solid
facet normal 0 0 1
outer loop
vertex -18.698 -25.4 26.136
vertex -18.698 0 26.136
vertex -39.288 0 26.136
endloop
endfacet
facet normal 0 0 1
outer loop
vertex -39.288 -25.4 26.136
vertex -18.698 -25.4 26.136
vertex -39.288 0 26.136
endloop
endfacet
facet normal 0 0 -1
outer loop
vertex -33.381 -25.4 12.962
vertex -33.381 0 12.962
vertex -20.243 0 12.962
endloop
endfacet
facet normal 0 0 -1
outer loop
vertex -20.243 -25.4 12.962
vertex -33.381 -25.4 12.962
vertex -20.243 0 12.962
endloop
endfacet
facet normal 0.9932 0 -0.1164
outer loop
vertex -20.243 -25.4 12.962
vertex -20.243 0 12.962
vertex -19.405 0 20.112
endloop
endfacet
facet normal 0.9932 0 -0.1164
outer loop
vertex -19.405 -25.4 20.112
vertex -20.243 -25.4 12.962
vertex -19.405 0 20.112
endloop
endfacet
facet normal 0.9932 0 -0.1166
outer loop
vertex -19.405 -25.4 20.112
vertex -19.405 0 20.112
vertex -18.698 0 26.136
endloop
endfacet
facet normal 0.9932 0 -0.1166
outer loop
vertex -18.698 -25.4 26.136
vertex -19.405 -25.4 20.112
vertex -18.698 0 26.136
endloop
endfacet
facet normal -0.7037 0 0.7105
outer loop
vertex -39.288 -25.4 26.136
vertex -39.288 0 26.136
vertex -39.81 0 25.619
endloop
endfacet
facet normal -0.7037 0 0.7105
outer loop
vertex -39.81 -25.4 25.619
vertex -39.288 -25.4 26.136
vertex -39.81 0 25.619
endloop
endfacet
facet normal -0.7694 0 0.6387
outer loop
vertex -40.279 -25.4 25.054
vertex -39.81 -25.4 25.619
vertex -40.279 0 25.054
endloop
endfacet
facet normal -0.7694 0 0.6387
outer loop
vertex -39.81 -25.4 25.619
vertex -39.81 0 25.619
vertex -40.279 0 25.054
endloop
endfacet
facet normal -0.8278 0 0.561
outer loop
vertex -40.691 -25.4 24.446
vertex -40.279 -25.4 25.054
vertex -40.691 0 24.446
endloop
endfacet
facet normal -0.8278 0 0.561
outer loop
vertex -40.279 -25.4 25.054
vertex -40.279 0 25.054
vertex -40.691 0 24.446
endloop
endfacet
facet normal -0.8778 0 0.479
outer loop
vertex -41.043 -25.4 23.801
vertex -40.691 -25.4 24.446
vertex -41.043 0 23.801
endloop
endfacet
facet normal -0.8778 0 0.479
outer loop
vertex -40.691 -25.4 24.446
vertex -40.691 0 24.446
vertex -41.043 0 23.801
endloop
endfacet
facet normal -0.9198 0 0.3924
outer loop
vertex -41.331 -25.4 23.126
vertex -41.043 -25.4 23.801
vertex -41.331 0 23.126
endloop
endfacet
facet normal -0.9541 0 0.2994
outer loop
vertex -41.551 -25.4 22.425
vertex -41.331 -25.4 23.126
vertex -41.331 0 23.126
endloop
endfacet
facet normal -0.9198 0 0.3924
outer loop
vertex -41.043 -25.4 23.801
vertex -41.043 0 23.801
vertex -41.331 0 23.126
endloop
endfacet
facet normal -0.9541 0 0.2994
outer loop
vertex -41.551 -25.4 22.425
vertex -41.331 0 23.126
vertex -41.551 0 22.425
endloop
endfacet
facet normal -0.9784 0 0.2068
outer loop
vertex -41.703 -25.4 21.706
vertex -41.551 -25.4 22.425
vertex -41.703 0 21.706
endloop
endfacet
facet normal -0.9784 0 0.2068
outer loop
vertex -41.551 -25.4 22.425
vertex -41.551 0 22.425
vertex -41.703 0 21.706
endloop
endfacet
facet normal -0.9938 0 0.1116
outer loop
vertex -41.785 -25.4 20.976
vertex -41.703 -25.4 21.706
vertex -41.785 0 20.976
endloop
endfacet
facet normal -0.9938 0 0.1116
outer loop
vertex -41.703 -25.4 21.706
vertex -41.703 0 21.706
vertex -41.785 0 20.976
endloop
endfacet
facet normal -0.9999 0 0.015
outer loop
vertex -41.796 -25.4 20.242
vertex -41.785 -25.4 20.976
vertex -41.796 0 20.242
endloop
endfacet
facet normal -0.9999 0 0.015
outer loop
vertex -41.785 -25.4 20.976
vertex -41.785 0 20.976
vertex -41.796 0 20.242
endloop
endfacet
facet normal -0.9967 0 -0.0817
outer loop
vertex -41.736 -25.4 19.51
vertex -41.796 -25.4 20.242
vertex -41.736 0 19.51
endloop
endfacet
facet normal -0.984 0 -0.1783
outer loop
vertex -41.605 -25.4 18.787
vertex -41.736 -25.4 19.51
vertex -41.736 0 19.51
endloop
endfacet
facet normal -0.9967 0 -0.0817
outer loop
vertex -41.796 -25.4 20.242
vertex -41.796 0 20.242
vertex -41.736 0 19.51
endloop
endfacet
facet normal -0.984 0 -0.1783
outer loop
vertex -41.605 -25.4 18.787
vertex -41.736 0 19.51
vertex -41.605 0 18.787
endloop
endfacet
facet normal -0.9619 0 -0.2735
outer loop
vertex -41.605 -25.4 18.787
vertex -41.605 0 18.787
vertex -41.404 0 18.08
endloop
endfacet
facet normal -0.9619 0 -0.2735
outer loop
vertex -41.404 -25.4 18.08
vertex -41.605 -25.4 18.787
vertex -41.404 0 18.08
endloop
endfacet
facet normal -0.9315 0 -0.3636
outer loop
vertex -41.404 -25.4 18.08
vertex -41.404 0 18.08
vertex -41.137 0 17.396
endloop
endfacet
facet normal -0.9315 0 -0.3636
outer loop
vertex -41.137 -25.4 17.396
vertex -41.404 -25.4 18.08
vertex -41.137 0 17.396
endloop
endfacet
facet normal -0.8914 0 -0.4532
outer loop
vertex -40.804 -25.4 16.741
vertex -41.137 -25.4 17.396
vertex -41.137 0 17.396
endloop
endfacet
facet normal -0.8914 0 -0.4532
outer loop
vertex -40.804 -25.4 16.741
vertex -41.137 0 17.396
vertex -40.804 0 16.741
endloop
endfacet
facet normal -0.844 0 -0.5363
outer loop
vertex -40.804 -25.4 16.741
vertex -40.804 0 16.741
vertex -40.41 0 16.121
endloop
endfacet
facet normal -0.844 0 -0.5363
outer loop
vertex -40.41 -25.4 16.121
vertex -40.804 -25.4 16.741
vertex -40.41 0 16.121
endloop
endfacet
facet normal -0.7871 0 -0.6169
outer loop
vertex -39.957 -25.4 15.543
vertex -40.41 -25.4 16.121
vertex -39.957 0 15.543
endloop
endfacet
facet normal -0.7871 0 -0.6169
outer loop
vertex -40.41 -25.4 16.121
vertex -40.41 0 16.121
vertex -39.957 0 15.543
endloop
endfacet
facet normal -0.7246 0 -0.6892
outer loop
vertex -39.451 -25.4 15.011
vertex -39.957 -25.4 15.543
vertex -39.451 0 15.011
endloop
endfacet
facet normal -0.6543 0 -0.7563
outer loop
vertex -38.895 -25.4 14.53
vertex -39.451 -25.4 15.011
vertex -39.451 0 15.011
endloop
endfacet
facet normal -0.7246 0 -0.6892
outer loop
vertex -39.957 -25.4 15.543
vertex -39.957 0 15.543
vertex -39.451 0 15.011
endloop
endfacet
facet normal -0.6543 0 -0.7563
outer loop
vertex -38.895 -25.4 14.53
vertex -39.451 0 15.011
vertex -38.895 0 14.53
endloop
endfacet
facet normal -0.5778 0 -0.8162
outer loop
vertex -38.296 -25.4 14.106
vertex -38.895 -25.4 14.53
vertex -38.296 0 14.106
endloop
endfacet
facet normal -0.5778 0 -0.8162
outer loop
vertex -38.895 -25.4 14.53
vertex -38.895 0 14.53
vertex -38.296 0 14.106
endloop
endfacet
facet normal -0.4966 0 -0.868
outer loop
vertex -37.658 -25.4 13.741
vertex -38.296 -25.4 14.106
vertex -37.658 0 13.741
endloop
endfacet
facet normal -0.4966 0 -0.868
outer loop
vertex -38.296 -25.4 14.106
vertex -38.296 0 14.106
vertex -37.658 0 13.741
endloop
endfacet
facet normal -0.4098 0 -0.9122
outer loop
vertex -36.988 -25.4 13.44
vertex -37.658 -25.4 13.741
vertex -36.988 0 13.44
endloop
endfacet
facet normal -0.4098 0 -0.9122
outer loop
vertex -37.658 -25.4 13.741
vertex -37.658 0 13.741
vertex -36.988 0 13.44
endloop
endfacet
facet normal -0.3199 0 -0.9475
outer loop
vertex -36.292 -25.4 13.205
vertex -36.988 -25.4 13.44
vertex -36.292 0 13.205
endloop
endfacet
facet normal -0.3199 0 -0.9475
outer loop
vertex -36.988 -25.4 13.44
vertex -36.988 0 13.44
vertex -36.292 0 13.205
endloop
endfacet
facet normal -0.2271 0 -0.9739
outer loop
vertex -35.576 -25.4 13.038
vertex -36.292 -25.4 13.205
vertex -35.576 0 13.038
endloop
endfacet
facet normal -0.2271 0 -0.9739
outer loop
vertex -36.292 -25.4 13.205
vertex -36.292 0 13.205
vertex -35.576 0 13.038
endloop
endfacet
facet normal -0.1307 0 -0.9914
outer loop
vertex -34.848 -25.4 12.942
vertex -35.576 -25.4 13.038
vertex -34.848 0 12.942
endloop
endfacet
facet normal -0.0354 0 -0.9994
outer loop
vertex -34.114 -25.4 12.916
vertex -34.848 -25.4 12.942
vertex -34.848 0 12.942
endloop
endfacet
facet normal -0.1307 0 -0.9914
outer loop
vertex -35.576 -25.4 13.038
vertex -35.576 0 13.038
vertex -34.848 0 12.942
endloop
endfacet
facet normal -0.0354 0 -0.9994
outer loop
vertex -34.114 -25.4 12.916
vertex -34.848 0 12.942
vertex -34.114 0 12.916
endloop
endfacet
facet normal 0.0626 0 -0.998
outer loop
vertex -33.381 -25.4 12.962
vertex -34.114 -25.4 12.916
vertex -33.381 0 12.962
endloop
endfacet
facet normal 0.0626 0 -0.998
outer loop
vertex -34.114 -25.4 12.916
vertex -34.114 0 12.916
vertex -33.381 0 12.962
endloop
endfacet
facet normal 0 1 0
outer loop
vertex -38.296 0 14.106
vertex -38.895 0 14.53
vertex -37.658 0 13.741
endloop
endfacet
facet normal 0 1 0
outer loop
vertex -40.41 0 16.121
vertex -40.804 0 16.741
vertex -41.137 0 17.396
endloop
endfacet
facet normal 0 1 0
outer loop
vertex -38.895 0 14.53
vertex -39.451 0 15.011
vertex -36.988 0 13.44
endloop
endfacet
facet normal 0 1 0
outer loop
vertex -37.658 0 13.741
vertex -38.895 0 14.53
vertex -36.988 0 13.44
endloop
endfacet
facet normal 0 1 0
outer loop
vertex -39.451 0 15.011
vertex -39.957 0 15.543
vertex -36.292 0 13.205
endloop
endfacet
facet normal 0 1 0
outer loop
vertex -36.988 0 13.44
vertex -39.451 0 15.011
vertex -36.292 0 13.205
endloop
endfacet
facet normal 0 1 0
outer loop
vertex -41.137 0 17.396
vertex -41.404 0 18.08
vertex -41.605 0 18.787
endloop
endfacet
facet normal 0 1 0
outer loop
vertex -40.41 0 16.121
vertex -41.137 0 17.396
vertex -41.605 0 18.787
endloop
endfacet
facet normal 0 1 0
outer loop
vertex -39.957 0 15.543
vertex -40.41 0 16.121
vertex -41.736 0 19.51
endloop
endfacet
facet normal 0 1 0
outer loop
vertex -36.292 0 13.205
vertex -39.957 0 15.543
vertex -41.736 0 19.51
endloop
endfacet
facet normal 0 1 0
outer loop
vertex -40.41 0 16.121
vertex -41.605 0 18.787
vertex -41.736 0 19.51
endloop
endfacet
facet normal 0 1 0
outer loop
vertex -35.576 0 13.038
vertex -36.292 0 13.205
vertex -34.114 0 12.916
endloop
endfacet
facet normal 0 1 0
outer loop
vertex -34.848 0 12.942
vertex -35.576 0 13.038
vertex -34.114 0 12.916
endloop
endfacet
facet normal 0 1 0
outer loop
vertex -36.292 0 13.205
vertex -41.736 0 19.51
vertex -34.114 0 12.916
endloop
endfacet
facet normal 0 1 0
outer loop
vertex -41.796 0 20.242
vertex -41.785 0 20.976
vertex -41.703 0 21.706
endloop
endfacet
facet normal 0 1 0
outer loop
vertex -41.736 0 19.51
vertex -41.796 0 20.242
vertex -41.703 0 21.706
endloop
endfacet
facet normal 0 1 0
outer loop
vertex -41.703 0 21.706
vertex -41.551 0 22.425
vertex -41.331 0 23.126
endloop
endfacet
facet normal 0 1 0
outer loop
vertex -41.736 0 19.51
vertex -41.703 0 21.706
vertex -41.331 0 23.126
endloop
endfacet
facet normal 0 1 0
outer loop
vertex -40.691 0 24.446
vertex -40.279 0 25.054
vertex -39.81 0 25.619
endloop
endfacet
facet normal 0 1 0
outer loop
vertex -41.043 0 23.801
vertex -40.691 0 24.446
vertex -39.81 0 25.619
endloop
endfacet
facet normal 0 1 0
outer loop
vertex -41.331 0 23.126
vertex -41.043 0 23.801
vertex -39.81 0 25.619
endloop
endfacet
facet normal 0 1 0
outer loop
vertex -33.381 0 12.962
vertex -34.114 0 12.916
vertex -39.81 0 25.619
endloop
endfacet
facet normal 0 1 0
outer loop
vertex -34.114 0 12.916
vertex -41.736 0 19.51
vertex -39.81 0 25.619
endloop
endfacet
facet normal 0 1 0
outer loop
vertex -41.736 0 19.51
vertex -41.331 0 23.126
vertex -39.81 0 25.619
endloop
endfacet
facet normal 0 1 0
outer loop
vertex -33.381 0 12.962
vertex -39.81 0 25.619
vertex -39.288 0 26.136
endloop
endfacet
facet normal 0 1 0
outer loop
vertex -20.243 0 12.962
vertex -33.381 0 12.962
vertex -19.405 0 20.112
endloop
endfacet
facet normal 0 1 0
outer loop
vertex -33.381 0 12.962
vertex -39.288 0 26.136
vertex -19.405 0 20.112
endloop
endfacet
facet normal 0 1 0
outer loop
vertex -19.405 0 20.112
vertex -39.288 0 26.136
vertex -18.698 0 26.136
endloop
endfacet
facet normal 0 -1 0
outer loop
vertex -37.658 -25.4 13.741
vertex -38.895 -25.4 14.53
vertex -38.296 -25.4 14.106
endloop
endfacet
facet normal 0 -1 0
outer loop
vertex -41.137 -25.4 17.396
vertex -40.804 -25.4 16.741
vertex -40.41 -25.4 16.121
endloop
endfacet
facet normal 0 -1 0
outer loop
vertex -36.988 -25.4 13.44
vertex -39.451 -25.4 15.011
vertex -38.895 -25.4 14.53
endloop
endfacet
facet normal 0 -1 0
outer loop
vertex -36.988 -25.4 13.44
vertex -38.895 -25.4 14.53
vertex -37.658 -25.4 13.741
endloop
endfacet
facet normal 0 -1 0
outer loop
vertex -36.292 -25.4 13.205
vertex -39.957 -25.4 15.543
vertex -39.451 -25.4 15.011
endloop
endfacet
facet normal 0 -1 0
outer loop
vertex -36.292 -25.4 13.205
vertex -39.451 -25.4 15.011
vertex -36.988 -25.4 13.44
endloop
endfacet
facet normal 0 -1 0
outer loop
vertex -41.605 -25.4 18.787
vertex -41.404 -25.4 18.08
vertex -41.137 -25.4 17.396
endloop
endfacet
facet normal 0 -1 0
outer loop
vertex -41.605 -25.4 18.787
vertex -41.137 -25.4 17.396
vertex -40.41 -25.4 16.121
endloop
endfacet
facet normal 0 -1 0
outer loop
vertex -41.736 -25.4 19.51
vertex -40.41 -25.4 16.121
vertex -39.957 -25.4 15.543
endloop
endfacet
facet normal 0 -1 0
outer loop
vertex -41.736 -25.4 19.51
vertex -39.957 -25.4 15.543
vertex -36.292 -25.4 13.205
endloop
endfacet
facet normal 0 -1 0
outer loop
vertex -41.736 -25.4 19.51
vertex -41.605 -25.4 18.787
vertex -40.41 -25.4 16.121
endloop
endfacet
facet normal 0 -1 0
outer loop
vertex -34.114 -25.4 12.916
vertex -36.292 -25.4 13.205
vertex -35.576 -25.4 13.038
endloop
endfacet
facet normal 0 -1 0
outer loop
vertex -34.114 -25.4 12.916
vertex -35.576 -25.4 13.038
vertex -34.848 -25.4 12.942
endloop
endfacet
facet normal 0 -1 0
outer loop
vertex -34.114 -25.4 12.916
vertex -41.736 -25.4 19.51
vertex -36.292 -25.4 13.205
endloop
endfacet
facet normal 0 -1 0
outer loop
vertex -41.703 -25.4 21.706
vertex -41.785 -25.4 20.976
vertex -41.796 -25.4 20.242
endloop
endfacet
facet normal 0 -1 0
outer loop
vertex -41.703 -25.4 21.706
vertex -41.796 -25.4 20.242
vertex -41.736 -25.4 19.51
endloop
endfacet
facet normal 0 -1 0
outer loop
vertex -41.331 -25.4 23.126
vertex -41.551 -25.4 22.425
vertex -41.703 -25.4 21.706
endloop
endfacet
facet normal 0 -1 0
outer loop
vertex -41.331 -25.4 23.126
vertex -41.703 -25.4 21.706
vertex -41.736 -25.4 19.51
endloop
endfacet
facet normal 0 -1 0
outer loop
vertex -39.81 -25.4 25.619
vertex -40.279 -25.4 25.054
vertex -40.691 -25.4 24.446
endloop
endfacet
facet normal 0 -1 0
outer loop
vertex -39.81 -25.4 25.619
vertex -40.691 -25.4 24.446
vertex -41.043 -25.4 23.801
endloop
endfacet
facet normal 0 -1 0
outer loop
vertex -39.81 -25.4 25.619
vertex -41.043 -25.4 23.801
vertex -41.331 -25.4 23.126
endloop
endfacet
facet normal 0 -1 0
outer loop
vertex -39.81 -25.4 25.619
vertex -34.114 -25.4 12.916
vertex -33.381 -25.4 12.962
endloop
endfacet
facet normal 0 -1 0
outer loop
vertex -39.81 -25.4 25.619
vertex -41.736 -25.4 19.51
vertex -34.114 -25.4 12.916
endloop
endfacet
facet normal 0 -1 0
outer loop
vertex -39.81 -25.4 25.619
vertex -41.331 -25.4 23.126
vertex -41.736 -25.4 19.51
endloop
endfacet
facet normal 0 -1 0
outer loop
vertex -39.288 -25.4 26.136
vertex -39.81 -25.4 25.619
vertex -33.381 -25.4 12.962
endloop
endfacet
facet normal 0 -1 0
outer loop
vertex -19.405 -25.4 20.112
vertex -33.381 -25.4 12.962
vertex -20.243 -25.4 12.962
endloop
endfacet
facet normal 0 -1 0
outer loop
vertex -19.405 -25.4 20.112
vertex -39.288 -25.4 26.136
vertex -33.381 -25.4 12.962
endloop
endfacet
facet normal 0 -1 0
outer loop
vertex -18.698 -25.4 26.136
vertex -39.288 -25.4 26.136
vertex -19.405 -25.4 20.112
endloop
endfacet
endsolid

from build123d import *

# Parameters (mm, degrees)
F1_DEPTH = 25.4


with BuildPart() as f1:
    # F0 (on Front) → F1 (new body)
    with BuildSketch(Plane.XZ):
        with BuildLine():
            Line((-29.147431, 26.136464), (-39.287967, 26.136464))
            ThreePointArc((-39.287967, 26.136464), (-41.136623, 17.396081), (-33.380877, 12.962096))
            Line((-33.380877, 12.962096), (-20.243494, 12.962096))
            Line((-20.243494, 12.962096), (-19.404731, 20.111647))
            Line((-19.404731, 20.111647), (-18.697919, 26.136464))
            Line((-18.697919, 26.136464), (-28.992943, 26.136464))
            Line((-28.992943, 26.136464), (-29.147431, 26.136464))
        make_face()
    extrude(amount=F1_DEPTH)


solid = f1.part
